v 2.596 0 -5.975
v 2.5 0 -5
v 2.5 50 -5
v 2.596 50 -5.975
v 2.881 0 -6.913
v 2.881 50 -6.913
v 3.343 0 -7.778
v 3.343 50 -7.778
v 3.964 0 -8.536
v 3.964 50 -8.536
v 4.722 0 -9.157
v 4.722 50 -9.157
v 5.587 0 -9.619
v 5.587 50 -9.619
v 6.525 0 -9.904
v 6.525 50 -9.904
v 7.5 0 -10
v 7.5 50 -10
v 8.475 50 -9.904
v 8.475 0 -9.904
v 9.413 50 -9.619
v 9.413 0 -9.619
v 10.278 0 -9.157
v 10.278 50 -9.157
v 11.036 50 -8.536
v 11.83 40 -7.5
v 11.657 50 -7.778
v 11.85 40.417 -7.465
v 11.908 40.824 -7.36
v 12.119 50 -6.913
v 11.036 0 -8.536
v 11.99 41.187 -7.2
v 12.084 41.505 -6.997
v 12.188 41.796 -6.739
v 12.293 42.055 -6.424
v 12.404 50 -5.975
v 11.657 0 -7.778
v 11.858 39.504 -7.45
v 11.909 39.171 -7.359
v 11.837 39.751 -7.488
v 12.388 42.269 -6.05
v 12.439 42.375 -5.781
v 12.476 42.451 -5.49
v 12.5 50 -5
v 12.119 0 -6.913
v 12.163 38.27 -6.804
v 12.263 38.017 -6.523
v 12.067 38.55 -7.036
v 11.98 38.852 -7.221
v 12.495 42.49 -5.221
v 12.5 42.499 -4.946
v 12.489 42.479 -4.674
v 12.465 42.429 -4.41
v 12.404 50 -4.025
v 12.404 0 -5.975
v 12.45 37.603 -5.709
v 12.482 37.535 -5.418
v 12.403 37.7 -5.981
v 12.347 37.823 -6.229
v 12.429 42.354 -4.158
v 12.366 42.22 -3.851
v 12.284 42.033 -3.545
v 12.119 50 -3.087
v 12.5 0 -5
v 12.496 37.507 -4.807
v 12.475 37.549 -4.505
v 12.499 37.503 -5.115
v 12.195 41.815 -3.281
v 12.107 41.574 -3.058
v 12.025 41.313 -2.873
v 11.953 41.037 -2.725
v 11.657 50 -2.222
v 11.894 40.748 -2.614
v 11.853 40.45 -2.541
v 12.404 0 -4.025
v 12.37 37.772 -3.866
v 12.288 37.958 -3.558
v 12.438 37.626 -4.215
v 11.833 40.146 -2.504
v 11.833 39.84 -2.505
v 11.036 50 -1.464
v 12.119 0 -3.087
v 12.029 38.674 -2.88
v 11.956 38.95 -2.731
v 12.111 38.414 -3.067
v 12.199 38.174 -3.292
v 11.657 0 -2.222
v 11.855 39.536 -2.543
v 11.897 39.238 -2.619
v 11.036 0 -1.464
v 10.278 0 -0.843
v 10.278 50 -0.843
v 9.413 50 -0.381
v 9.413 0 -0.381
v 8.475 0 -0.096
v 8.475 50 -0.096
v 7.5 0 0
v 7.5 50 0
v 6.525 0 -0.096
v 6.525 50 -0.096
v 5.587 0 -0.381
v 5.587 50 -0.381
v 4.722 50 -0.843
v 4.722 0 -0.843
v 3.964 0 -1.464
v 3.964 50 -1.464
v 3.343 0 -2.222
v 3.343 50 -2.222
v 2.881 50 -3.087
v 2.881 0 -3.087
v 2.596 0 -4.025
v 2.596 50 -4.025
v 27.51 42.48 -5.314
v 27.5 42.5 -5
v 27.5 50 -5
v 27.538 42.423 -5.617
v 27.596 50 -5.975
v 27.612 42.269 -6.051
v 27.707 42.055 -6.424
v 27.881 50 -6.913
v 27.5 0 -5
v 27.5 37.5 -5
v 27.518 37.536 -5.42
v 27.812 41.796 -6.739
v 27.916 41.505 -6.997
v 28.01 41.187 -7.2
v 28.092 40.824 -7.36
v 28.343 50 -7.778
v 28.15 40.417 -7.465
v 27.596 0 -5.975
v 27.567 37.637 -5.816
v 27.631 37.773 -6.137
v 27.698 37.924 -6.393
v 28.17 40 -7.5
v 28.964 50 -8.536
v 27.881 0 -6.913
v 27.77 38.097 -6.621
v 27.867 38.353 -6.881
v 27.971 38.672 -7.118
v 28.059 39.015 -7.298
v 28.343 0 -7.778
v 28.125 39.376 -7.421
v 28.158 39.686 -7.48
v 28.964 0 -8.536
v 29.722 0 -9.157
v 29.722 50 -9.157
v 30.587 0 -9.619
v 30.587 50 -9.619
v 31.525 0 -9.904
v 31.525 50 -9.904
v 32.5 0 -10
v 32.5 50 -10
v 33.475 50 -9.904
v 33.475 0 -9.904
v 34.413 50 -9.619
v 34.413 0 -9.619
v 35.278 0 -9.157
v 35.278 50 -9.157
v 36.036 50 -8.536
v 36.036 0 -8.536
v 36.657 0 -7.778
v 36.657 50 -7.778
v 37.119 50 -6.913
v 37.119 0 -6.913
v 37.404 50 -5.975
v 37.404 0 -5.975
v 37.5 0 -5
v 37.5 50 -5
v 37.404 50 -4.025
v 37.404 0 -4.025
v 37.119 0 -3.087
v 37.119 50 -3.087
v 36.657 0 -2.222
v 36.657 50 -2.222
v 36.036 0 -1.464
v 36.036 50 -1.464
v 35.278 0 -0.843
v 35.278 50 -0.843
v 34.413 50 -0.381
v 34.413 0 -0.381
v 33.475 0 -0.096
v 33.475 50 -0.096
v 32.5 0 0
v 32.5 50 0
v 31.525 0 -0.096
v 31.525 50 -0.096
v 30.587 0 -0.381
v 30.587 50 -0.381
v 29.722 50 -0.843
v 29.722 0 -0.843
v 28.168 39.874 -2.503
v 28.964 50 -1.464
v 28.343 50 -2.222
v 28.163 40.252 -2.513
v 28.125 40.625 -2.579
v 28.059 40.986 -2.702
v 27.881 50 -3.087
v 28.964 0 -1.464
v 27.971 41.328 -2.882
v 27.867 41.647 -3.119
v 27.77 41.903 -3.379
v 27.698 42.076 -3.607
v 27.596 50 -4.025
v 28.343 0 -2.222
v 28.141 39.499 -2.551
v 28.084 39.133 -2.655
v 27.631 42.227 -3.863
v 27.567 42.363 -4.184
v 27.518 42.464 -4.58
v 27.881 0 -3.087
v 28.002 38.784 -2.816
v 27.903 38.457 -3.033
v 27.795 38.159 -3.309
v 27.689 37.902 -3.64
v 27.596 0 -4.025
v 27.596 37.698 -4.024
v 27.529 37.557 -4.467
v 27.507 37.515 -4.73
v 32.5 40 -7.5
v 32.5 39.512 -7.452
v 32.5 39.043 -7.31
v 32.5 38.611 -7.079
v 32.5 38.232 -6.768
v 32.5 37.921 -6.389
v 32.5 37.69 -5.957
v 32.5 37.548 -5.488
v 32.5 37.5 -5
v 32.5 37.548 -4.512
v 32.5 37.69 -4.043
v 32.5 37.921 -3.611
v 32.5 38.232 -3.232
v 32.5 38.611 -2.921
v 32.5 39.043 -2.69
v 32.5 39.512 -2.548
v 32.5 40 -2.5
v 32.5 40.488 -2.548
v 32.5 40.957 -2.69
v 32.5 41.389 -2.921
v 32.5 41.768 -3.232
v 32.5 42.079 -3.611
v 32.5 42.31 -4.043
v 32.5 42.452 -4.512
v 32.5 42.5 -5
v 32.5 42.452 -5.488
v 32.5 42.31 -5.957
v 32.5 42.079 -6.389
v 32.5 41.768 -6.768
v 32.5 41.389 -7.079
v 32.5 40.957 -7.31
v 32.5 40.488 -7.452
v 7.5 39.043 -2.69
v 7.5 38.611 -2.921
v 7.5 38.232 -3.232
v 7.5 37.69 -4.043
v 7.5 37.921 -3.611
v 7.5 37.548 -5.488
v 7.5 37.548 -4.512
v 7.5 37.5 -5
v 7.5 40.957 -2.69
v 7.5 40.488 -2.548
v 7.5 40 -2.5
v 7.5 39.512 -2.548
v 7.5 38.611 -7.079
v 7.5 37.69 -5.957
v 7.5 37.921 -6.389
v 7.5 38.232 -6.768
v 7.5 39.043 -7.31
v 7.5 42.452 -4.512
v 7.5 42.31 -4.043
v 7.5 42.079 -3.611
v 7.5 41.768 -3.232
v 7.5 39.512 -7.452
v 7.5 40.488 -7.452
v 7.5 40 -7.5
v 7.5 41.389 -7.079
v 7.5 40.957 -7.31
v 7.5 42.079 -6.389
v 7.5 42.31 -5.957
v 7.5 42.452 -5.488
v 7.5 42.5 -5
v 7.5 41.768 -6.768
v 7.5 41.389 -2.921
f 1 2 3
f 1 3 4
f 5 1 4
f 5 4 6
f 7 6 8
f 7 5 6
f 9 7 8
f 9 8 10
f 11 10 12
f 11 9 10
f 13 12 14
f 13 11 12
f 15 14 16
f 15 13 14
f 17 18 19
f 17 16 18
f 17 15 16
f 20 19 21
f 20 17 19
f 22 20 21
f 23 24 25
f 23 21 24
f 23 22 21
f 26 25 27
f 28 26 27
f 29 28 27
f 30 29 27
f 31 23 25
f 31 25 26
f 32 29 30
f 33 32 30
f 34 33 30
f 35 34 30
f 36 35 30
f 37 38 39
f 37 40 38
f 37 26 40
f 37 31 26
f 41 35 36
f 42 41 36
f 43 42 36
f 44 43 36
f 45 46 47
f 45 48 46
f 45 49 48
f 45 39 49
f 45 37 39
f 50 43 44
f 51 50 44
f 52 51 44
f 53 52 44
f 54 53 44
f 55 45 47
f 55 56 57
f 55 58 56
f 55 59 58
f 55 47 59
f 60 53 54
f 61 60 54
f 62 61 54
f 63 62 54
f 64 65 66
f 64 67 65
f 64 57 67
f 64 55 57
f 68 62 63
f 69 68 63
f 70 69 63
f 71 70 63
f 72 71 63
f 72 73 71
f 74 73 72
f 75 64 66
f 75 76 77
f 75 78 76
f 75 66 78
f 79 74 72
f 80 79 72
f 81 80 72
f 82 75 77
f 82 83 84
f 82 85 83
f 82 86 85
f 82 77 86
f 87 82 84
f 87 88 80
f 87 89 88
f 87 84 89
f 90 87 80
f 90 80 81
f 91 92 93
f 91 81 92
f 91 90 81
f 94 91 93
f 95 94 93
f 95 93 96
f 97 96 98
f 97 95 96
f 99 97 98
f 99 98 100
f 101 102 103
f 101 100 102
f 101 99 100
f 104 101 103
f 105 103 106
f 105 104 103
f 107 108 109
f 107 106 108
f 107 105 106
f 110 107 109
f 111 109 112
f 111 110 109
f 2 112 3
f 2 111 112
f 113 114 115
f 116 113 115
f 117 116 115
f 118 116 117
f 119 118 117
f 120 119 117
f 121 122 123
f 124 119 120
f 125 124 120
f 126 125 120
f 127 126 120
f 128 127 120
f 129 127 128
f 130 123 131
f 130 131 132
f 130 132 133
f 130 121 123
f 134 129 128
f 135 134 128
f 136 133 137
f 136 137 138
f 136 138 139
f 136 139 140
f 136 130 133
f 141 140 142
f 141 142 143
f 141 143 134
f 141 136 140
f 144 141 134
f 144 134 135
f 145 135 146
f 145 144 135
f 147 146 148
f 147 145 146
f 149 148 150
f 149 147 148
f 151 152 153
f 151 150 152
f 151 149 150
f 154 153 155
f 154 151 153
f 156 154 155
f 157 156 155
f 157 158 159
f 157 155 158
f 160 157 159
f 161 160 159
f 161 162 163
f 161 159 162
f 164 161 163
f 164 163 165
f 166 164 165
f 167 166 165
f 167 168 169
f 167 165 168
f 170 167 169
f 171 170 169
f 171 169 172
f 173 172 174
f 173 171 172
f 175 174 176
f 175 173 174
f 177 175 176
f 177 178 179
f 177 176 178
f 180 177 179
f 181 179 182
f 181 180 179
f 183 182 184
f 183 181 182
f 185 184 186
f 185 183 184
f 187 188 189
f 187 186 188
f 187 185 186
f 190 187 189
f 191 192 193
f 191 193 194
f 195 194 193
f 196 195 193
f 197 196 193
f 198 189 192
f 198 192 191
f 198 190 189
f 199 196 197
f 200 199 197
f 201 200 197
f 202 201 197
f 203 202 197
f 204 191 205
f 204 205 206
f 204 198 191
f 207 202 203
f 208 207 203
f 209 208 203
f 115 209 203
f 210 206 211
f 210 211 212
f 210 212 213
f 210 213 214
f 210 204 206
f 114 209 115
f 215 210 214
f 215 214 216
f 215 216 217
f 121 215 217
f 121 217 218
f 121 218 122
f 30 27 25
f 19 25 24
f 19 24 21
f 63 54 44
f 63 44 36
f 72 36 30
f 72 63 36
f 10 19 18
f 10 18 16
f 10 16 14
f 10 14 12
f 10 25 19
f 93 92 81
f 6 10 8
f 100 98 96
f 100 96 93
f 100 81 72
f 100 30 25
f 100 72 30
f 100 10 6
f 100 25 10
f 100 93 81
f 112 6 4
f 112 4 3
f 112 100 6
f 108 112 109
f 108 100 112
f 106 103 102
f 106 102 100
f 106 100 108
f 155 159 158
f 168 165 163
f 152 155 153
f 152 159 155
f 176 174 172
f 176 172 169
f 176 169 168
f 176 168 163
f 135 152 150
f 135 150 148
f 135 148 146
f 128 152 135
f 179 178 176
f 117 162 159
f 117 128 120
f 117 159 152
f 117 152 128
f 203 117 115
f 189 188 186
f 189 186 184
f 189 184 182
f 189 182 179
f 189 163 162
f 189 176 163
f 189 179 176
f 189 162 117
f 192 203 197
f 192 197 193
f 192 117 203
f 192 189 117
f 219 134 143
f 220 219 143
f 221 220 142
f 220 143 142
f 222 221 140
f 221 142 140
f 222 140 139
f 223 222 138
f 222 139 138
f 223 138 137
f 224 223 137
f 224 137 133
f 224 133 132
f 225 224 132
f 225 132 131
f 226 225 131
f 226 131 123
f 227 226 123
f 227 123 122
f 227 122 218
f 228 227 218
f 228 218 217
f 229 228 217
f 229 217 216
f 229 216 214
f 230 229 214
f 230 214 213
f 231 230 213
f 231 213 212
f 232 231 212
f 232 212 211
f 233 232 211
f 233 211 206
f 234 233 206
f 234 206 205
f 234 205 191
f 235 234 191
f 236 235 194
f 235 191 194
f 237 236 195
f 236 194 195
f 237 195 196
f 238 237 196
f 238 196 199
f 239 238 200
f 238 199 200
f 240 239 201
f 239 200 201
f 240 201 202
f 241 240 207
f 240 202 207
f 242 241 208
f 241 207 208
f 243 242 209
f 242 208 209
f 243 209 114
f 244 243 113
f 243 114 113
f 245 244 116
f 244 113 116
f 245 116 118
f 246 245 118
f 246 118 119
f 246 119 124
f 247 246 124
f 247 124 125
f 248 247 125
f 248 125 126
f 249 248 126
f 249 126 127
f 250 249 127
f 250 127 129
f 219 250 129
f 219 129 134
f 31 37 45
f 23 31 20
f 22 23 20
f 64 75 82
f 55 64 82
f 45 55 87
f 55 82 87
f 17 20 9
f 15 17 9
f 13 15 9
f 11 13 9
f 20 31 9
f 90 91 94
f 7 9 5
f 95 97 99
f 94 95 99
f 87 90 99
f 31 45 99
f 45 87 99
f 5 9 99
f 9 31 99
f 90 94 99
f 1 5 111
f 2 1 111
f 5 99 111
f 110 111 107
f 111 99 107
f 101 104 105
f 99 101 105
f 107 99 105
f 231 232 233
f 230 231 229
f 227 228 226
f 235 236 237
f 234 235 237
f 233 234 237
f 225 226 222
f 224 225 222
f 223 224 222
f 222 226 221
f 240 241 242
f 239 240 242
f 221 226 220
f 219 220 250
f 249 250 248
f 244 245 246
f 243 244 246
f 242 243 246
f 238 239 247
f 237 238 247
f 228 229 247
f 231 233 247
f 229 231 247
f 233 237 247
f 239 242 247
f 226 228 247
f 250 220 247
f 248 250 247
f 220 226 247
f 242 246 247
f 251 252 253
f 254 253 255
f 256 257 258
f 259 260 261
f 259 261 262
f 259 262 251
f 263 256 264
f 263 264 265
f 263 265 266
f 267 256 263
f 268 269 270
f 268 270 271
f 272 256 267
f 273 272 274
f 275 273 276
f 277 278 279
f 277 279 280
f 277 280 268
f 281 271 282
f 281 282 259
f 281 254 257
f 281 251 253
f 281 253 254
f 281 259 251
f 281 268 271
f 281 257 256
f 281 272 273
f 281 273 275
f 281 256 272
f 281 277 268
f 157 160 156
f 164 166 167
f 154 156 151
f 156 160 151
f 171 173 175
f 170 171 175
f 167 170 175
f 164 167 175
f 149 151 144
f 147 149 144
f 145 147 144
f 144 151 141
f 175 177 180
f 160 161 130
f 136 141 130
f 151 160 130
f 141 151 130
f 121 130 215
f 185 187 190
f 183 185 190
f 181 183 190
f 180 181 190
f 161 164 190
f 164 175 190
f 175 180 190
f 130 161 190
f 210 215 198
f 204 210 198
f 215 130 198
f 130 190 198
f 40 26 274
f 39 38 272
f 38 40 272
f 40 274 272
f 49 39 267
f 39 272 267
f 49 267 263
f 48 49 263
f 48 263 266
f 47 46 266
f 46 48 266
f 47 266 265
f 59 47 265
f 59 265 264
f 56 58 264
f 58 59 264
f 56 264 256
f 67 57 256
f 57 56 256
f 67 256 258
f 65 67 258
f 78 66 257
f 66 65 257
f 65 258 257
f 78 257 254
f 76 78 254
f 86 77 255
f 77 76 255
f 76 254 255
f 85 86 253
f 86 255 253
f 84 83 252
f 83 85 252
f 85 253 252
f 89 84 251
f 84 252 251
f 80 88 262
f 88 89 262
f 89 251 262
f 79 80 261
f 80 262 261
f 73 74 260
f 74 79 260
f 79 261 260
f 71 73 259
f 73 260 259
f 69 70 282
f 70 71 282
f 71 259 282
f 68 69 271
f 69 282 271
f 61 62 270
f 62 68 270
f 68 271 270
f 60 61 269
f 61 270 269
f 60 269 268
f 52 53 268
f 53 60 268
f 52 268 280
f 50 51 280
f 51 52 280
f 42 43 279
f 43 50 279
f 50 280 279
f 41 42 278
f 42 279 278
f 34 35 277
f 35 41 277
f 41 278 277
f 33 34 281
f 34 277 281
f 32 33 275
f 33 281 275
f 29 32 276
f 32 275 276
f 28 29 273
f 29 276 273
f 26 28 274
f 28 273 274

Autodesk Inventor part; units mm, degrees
ref_plane "YZ Plane" through (0, 0, 0) normal (1, 0, 0) x (0, 1, 0)
ref_plane "XZ Plane" through (0, 0, 0) normal (0, 1, 0) x (-1, 0, 0)
ref_plane "XY Plane" through (0, 0, 0) normal (0, 0, 1) x (1, 0, 0)
sketch "草圖1" plane through (0, 0, 0) normal (0, 1, 0) x (-1, 0, 0)
  line L0 (0, 0) -> (-15, 0) construction
  line L1 (-15, 0) -> (-15, -10) construction
  line L2 (-15, -10) -> (0, -10) construction
  line L3 (0, -10) -> (0, 0) construction
  line L4 (-25, 0) -> (-40, 0) construction
  line L5 (-40, 0) -> (-40, -10) construction
  line L6 (-40, -10) -> (-25, -10) construction
  line L7 (-25, -10) -> (-25, 0) construction
  circle A0 centre (-7.5, -5) radius 5
  circle A1 centre (-32.5, -5) radius 5
  dimension "d0" = 15
  dimension "d1" = 15
  dimension "d2" = 10
  dimension "d3" = 10
  dimension "d4" = 10
  dimension "d5" = 10
  dimension "d6" = 7.5
  dimension "d7" = 25
  dimension "d8" = 5
  dimension "d9" = 5
extrude "擠出1" add sketch "草圖1" along normal blind 50
ref_plane "工作平面1" through (7.5, 40, -5) normal (0, 1, 0) x (1, 0, 0)
sketch "草圖4" plane through (7.5, 40, -5) normal (0, 1, 0) x (1, 0, 0)
  line L0 (0, 0) -> (25, 0)
  line L1 (25, 0) -> (25, 2.5)
  line L2 (25, 2.5) -> (0, 2.5)
  line L3 (0, 2.5) -> (0, 0)
  circle A0 centre (25, 0) radius 5 projected
  circle A1 centre (0, 0) radius 5 projected
  point P0 (-7.5, -5)
  dimension "d17" = 0
  dimension "d18" = 0
  dimension "d19" = 2.5
  dimension "d20" = 0
revolve "迴轉2" cut sketch "草圖4" angle 360 about axis through (7.5, 40, -5) along (1, 0, 0) picked at (1.4434, 1.6667) picked at (23.5566, 1.6667) contours L3 L2 A1 L0 | A1 L2 A0 L0 | A0 L2 L1 L0
properties part number "槌子支架"
